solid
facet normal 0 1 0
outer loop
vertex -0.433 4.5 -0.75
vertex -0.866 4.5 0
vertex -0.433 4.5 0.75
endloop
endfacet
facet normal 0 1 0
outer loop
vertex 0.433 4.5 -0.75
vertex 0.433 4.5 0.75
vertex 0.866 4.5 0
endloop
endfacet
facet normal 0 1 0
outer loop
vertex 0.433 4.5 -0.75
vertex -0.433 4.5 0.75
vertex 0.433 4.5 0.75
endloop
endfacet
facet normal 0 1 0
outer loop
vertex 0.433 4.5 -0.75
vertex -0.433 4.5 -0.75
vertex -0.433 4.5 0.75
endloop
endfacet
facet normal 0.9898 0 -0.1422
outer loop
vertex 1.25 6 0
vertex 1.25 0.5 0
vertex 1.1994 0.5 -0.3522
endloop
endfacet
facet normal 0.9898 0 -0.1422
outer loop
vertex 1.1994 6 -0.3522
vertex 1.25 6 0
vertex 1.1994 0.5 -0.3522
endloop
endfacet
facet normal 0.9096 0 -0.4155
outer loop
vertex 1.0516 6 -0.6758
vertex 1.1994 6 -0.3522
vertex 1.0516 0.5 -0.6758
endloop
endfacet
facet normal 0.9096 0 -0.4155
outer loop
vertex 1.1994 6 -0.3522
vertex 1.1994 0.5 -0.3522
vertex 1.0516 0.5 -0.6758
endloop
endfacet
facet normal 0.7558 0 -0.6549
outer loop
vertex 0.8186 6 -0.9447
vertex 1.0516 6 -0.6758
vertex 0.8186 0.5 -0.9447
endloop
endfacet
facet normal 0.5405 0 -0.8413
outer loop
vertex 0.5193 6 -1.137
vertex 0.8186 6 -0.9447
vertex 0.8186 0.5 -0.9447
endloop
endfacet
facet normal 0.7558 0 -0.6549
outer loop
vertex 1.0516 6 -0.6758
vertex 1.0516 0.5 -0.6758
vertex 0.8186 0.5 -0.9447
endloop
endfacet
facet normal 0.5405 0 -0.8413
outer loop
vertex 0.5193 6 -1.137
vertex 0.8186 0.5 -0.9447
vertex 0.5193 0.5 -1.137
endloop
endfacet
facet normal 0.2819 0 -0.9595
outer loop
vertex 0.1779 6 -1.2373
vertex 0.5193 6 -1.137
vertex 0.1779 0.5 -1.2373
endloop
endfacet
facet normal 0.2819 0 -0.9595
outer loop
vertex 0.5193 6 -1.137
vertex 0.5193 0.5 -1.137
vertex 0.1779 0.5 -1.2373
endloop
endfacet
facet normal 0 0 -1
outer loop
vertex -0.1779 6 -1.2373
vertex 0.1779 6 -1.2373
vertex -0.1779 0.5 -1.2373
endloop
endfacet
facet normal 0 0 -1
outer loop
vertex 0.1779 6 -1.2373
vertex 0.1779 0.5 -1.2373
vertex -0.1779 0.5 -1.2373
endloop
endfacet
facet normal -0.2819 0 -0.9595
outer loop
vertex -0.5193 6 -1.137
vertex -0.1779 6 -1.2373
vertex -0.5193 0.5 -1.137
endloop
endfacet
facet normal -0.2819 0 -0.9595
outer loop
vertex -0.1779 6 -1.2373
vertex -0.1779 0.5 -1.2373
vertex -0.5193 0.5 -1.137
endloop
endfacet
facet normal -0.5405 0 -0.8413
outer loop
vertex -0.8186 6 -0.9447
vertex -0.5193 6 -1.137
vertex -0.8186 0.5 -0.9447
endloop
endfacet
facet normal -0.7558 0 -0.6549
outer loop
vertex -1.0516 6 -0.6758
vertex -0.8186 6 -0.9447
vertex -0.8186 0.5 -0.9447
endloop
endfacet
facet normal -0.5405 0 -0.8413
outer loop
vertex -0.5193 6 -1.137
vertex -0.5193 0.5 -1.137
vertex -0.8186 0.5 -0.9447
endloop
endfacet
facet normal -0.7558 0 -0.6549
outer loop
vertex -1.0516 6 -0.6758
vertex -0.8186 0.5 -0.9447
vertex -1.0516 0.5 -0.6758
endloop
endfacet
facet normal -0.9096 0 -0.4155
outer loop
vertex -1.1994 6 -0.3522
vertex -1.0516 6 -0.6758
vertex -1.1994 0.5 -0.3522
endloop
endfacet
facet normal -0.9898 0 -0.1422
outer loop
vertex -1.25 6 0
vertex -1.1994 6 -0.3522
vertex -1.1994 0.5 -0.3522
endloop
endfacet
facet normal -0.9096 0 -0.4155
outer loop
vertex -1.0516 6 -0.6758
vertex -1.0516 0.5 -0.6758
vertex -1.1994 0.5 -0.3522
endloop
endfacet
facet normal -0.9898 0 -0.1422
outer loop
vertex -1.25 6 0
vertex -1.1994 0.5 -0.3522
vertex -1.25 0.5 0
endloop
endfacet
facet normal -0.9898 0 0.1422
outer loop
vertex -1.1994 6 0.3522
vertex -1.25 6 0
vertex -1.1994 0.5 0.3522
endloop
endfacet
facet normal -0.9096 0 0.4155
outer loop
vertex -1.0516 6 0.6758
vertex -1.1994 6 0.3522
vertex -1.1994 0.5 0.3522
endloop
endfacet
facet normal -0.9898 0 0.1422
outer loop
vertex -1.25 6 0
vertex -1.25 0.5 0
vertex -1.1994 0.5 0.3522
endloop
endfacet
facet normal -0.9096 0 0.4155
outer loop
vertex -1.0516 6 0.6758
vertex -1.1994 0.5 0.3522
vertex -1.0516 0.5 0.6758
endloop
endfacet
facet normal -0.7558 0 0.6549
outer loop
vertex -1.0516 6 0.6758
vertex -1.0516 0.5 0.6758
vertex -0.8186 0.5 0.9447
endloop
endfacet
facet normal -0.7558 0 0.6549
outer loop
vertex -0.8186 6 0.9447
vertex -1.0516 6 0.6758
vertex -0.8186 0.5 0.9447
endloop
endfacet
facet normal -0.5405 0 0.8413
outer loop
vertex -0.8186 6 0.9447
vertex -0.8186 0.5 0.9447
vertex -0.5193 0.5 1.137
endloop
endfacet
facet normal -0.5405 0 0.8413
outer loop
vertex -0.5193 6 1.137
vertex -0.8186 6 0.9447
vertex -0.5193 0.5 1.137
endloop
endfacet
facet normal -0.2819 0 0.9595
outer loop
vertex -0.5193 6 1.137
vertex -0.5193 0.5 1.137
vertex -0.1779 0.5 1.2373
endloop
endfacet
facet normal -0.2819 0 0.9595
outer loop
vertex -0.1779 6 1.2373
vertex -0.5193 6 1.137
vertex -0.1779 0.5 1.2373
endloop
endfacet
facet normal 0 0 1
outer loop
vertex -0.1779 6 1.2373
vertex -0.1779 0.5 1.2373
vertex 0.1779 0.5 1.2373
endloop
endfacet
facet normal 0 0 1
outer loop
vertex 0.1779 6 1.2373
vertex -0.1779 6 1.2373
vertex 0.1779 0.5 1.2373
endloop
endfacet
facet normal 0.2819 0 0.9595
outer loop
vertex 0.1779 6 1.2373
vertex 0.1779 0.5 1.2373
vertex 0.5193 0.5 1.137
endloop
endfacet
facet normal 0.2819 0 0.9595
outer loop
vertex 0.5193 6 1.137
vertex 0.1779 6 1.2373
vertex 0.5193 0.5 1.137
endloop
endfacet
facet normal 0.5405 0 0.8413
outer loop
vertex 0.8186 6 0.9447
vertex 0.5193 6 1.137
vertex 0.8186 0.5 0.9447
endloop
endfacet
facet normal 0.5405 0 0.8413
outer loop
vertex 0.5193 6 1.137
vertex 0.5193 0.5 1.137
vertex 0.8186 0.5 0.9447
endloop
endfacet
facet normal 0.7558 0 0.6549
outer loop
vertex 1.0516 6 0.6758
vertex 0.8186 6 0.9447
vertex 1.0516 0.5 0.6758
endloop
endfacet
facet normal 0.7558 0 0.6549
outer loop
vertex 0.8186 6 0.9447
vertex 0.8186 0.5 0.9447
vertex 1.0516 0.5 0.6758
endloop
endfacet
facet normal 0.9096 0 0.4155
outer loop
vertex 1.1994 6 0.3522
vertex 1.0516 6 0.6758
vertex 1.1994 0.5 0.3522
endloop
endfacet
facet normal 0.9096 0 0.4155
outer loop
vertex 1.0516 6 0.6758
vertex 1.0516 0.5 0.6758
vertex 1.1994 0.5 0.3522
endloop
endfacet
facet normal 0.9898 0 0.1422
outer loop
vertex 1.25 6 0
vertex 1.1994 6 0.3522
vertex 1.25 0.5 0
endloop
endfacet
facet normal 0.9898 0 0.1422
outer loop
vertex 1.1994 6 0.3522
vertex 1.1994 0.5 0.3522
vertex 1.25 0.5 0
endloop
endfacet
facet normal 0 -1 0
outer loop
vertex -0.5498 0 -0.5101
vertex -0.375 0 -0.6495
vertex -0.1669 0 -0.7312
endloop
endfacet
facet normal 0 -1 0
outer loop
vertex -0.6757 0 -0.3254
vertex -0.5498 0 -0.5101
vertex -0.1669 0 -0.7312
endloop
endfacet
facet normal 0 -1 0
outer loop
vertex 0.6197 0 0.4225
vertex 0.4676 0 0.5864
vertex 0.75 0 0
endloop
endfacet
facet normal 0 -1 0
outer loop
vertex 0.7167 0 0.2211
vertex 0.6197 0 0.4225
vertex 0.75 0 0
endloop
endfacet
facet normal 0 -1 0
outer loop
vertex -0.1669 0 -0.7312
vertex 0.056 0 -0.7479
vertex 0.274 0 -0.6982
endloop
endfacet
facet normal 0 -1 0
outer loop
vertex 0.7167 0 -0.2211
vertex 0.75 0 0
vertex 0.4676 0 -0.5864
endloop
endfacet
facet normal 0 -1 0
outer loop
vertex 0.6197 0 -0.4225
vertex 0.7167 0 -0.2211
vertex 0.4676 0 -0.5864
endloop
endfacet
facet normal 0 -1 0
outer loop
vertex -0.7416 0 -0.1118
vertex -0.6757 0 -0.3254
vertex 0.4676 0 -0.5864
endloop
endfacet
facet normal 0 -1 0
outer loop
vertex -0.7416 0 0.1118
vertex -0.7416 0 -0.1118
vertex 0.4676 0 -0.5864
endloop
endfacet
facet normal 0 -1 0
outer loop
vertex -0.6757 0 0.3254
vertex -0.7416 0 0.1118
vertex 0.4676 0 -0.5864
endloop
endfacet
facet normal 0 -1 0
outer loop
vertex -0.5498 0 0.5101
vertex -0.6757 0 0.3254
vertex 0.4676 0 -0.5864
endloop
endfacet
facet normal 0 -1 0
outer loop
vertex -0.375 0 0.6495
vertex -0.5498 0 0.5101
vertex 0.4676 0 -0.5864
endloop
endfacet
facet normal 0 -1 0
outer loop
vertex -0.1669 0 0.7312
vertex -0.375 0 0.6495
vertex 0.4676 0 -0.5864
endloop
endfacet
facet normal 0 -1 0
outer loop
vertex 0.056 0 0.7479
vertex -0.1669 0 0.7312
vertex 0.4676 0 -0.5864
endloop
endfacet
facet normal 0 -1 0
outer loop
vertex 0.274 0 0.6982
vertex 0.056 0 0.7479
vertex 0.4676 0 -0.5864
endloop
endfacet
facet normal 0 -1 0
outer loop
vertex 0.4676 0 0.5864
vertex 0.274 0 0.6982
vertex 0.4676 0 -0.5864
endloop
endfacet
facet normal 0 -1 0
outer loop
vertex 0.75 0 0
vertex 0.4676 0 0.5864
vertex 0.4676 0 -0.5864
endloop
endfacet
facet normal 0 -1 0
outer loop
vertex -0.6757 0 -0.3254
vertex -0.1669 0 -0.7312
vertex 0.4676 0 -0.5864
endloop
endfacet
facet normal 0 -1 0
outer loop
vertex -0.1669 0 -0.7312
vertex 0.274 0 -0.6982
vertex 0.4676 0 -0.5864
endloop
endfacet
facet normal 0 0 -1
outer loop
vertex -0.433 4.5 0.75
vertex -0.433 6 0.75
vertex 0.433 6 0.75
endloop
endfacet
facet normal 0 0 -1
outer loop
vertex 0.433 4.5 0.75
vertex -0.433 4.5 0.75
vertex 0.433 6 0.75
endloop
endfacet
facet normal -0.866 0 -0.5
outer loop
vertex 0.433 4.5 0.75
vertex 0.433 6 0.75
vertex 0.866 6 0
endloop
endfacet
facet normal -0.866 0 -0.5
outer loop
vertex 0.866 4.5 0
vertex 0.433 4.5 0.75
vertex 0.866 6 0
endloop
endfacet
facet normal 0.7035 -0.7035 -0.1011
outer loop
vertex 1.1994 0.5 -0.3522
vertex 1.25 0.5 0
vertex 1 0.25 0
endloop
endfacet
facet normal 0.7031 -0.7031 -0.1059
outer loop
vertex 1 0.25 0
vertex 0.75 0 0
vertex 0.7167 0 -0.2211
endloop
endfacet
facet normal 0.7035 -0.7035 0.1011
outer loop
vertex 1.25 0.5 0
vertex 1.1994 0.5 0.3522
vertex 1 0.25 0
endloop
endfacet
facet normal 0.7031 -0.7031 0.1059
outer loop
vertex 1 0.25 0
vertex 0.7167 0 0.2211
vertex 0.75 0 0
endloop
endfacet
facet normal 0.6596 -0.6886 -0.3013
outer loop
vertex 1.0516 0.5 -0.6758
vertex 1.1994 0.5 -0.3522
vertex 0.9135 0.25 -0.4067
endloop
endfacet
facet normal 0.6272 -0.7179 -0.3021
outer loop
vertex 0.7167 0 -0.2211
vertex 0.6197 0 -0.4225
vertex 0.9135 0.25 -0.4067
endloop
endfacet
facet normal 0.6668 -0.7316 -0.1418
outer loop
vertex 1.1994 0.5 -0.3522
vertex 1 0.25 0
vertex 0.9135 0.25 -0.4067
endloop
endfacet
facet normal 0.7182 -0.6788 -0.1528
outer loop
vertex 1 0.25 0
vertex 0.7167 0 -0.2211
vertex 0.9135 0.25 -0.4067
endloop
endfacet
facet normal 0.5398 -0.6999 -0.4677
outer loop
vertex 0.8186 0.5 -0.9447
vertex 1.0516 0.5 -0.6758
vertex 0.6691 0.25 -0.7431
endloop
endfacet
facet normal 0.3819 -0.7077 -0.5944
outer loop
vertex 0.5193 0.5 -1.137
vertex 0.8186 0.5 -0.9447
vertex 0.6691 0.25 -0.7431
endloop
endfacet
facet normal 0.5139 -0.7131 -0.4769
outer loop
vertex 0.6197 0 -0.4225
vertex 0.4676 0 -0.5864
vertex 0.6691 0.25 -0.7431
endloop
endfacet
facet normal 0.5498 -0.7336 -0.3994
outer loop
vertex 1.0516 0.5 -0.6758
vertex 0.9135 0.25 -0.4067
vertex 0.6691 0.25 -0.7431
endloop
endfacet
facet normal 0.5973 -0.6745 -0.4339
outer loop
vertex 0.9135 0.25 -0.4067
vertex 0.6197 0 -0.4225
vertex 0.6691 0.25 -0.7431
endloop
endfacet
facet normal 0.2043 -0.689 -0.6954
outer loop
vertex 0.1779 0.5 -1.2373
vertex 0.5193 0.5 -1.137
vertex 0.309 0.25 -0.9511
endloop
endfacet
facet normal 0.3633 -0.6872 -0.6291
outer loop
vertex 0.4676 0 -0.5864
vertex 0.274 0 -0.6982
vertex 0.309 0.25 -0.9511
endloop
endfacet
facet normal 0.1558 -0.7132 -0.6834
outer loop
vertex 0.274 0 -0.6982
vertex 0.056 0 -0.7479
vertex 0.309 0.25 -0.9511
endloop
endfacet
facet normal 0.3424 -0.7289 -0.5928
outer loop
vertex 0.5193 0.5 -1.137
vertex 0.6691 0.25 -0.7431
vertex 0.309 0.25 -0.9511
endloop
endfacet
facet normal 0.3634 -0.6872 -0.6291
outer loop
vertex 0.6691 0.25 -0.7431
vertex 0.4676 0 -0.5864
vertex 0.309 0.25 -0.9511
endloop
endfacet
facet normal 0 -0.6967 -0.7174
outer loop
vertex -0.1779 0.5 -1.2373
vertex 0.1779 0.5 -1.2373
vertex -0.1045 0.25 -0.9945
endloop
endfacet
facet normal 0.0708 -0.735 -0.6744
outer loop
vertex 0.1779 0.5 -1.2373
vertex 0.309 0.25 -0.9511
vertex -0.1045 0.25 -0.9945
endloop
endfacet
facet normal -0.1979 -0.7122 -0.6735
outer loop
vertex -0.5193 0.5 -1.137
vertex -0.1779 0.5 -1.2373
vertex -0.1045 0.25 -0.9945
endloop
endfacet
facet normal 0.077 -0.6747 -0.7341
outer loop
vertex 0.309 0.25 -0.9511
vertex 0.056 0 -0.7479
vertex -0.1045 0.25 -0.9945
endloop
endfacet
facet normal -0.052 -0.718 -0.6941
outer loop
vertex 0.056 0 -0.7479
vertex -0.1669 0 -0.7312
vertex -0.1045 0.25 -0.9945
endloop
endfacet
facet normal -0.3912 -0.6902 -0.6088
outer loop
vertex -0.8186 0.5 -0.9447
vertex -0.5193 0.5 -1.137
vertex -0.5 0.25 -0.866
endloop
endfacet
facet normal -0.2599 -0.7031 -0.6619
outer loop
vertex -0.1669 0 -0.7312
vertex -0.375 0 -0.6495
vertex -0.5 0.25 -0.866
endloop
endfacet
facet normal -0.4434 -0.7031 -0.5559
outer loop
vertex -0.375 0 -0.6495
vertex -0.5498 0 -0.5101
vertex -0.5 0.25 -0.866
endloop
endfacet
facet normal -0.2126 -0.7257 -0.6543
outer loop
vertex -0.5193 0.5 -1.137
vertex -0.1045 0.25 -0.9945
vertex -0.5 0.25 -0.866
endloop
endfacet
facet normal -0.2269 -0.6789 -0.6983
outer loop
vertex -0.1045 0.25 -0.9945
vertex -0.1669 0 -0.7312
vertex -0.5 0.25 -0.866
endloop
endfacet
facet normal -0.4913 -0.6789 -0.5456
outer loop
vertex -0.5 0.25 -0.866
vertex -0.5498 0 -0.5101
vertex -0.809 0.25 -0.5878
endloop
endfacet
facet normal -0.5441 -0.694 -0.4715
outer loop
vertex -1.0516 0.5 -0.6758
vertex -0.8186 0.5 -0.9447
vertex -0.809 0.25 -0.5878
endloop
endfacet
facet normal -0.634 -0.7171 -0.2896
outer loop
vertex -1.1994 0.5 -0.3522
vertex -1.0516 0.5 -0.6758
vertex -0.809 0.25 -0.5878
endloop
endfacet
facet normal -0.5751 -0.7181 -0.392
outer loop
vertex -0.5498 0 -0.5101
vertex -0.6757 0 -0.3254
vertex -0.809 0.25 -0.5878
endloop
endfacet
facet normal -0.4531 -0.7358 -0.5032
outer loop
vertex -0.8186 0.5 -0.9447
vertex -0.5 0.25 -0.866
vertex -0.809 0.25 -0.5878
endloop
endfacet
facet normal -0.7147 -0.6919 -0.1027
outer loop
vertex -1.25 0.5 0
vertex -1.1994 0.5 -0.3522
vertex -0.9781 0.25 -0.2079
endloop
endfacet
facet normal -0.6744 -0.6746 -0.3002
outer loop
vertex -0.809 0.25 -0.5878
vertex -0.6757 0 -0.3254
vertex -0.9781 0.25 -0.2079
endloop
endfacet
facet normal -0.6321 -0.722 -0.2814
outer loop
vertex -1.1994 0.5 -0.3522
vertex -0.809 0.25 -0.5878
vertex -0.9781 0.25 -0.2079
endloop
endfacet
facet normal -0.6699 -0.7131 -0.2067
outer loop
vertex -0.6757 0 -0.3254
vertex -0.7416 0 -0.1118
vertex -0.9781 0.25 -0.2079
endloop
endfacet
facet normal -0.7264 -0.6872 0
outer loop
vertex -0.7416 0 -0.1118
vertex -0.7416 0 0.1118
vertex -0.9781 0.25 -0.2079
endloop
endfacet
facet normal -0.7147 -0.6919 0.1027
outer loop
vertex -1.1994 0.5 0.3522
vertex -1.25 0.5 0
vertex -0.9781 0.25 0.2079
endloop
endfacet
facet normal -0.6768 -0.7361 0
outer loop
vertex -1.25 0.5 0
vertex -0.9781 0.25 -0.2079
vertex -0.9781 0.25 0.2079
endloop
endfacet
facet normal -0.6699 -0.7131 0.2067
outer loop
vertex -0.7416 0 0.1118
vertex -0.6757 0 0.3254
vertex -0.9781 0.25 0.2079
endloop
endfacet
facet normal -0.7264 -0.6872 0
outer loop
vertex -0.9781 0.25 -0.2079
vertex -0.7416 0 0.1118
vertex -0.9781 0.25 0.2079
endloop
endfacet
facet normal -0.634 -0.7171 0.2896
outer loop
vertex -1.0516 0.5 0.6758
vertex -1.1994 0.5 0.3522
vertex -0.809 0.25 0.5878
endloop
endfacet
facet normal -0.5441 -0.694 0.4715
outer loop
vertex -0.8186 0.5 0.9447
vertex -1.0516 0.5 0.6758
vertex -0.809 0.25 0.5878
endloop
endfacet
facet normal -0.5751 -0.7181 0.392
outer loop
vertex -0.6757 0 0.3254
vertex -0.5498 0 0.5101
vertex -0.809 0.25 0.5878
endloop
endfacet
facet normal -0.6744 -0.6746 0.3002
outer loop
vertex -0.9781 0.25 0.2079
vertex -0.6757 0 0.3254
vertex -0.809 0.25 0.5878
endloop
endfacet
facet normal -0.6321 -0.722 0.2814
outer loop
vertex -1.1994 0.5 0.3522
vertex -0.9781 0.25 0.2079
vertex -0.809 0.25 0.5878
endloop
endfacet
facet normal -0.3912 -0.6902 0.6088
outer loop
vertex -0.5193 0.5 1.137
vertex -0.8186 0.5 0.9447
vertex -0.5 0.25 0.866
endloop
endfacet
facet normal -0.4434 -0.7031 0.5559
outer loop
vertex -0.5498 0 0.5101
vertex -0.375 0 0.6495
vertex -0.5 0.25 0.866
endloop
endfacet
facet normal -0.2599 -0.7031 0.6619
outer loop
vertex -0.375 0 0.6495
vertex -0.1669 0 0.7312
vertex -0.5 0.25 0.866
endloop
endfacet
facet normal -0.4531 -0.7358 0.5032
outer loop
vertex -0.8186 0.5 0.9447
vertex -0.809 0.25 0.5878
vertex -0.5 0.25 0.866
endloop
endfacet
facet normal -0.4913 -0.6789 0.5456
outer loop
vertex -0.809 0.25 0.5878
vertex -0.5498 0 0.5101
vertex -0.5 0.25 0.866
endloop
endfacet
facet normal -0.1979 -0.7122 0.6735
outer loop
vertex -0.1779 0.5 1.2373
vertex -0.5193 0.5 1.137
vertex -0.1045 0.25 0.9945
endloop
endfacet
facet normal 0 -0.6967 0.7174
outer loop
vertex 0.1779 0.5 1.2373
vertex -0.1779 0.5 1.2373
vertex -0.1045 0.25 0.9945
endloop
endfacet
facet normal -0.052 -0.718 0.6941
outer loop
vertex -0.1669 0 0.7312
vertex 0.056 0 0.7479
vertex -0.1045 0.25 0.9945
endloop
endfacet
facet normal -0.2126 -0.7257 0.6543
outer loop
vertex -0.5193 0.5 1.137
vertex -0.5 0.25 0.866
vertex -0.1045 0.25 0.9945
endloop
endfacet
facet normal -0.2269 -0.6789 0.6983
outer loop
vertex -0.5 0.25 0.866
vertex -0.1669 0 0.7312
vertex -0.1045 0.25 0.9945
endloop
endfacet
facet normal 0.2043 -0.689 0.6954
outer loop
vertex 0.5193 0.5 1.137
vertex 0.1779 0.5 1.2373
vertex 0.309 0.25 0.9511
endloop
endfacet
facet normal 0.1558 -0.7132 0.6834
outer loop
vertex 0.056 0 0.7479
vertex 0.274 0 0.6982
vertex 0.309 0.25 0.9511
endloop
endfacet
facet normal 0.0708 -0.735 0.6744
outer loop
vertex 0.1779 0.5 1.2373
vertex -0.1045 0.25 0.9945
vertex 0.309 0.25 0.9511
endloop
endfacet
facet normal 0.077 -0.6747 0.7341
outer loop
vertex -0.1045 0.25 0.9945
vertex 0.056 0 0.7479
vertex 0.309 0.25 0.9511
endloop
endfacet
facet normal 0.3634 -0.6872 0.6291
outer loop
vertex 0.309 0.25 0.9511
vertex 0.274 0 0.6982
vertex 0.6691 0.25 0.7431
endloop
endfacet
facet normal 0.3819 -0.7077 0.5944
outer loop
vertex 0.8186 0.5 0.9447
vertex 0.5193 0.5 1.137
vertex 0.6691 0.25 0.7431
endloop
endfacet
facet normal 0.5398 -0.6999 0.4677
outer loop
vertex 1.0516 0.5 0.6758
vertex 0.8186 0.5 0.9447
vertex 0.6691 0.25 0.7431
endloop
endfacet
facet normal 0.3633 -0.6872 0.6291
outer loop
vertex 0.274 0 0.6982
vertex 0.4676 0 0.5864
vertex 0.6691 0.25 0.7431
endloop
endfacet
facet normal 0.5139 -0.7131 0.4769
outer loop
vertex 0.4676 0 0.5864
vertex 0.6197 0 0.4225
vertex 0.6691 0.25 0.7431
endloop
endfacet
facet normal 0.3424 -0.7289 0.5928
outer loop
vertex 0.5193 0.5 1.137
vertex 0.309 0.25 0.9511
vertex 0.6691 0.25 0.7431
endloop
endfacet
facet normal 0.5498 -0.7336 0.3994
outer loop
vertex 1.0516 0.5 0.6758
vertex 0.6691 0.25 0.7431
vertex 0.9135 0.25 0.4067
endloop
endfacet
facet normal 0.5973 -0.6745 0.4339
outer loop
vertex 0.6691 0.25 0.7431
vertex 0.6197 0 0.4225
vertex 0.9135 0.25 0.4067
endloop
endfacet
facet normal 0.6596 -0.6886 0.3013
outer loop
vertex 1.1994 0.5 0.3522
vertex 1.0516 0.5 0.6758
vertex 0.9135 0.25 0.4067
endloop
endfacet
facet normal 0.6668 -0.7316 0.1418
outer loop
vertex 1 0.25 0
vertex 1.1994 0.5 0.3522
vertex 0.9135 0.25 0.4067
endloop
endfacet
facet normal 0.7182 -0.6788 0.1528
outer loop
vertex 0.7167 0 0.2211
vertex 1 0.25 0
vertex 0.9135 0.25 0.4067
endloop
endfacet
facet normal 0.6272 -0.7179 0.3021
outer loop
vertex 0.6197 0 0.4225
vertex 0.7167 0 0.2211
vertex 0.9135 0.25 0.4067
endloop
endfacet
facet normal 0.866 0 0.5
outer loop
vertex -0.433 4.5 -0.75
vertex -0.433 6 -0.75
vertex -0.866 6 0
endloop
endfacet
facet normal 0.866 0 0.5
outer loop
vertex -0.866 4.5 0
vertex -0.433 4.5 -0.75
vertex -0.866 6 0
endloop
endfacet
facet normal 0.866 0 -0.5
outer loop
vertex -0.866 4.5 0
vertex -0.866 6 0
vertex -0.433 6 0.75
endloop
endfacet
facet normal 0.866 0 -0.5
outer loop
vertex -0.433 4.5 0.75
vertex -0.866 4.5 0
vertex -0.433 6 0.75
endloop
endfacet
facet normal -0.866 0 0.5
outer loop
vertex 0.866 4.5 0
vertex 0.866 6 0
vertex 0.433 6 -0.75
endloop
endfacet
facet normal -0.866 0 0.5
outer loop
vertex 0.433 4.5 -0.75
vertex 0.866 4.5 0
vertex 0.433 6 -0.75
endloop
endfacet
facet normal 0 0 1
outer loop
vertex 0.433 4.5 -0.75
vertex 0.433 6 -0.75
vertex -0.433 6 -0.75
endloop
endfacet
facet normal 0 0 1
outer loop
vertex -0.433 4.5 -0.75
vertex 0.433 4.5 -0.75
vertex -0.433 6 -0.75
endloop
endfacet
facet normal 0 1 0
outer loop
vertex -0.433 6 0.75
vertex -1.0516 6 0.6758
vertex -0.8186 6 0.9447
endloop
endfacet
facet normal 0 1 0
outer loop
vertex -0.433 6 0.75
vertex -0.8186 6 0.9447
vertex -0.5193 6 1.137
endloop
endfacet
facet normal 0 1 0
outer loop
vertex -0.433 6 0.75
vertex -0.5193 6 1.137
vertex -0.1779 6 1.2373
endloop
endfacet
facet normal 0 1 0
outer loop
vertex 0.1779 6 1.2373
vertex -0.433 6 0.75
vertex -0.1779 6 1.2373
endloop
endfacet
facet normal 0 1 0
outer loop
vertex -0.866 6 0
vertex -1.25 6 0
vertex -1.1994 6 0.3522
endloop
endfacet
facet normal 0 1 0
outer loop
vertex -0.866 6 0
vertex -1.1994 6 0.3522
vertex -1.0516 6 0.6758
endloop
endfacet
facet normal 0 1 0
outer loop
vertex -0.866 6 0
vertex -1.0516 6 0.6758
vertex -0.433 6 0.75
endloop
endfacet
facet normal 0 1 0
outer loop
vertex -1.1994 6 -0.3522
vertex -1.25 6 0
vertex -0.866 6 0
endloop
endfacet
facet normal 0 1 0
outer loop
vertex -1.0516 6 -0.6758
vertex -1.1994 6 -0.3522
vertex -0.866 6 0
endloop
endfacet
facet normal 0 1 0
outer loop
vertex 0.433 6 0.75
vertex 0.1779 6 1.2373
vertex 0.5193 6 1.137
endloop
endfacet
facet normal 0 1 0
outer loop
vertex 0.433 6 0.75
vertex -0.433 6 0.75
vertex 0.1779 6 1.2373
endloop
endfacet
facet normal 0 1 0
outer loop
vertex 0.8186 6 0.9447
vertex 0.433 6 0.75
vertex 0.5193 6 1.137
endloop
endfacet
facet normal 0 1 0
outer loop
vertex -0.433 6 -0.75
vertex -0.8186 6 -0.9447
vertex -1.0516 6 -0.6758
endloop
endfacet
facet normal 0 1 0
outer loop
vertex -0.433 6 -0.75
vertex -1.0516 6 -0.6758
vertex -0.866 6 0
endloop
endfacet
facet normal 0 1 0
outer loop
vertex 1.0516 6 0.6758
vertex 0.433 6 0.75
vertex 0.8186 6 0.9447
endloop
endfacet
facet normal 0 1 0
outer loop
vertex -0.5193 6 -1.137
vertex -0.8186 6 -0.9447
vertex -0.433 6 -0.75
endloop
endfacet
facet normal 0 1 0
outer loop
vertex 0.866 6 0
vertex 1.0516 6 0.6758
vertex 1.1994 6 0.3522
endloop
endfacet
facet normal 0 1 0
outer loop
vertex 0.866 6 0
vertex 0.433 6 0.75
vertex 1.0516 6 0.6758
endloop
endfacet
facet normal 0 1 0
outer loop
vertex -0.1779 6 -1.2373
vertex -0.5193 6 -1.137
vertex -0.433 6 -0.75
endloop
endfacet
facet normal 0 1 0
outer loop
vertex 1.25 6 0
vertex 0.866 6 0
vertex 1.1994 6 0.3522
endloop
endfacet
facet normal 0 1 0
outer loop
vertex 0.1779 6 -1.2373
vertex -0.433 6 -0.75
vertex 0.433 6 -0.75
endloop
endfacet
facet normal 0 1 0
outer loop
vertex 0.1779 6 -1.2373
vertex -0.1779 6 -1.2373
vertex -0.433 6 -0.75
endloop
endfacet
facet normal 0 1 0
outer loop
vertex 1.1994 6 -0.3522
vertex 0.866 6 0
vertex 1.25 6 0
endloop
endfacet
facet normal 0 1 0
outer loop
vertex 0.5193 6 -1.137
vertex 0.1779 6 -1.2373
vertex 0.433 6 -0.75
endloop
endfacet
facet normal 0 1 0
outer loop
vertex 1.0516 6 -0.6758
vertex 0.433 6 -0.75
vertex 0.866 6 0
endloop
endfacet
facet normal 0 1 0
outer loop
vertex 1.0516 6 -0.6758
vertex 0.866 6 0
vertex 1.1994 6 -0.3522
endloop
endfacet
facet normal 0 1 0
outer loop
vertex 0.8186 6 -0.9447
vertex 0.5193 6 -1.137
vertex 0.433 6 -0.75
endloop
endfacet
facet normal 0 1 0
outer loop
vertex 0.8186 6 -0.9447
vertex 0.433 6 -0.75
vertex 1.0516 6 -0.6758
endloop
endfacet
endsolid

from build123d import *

# Parameters (mm, degrees)
SKETCH1_R           = 1.25
BOSS_EXTRUDE1_DEPTH = 6
CHAMFER1_SIZE       = 0.5
CUT_EXTRUDE1_DEPTH  = 1.5


with BuildPart() as part:
    # Sketch1 → Boss-Extrude1 (new body)
    with BuildSketch(Plane(origin=(0, 0, 0), x_dir=(1, 0, 0), z_dir=(0, 1, 0))):
        Circle(SKETCH1_R)
    extrude(amount=BOSS_EXTRUDE1_DEPTH)

    # Chamfer1
    chamfer1_edges = [part.edges().sort_by_distance(p)[0] for p in [
        (-1.25, 0, 0),
    ]]
    chamfer(chamfer1_edges, length=CHAMFER1_SIZE)

    # Sketch2 → Cut-Extrude1 (cut)
    with BuildSketch(Plane(origin=(0, 6, 0), x_dir=(1, 0, 0), z_dir=(0, 1, 0))):
        Polygon((0.433012702, -0.75), (0.866025404, 0), (0.433012702, 0.75), (-0.433012702, 0.75), (-0.866025404, 0), (-0.433012702, -0.75), align=None)
    extrude(amount=-CUT_EXTRUDE1_DEPTH, mode=Mode.SUBTRACT)


solid = part.part
